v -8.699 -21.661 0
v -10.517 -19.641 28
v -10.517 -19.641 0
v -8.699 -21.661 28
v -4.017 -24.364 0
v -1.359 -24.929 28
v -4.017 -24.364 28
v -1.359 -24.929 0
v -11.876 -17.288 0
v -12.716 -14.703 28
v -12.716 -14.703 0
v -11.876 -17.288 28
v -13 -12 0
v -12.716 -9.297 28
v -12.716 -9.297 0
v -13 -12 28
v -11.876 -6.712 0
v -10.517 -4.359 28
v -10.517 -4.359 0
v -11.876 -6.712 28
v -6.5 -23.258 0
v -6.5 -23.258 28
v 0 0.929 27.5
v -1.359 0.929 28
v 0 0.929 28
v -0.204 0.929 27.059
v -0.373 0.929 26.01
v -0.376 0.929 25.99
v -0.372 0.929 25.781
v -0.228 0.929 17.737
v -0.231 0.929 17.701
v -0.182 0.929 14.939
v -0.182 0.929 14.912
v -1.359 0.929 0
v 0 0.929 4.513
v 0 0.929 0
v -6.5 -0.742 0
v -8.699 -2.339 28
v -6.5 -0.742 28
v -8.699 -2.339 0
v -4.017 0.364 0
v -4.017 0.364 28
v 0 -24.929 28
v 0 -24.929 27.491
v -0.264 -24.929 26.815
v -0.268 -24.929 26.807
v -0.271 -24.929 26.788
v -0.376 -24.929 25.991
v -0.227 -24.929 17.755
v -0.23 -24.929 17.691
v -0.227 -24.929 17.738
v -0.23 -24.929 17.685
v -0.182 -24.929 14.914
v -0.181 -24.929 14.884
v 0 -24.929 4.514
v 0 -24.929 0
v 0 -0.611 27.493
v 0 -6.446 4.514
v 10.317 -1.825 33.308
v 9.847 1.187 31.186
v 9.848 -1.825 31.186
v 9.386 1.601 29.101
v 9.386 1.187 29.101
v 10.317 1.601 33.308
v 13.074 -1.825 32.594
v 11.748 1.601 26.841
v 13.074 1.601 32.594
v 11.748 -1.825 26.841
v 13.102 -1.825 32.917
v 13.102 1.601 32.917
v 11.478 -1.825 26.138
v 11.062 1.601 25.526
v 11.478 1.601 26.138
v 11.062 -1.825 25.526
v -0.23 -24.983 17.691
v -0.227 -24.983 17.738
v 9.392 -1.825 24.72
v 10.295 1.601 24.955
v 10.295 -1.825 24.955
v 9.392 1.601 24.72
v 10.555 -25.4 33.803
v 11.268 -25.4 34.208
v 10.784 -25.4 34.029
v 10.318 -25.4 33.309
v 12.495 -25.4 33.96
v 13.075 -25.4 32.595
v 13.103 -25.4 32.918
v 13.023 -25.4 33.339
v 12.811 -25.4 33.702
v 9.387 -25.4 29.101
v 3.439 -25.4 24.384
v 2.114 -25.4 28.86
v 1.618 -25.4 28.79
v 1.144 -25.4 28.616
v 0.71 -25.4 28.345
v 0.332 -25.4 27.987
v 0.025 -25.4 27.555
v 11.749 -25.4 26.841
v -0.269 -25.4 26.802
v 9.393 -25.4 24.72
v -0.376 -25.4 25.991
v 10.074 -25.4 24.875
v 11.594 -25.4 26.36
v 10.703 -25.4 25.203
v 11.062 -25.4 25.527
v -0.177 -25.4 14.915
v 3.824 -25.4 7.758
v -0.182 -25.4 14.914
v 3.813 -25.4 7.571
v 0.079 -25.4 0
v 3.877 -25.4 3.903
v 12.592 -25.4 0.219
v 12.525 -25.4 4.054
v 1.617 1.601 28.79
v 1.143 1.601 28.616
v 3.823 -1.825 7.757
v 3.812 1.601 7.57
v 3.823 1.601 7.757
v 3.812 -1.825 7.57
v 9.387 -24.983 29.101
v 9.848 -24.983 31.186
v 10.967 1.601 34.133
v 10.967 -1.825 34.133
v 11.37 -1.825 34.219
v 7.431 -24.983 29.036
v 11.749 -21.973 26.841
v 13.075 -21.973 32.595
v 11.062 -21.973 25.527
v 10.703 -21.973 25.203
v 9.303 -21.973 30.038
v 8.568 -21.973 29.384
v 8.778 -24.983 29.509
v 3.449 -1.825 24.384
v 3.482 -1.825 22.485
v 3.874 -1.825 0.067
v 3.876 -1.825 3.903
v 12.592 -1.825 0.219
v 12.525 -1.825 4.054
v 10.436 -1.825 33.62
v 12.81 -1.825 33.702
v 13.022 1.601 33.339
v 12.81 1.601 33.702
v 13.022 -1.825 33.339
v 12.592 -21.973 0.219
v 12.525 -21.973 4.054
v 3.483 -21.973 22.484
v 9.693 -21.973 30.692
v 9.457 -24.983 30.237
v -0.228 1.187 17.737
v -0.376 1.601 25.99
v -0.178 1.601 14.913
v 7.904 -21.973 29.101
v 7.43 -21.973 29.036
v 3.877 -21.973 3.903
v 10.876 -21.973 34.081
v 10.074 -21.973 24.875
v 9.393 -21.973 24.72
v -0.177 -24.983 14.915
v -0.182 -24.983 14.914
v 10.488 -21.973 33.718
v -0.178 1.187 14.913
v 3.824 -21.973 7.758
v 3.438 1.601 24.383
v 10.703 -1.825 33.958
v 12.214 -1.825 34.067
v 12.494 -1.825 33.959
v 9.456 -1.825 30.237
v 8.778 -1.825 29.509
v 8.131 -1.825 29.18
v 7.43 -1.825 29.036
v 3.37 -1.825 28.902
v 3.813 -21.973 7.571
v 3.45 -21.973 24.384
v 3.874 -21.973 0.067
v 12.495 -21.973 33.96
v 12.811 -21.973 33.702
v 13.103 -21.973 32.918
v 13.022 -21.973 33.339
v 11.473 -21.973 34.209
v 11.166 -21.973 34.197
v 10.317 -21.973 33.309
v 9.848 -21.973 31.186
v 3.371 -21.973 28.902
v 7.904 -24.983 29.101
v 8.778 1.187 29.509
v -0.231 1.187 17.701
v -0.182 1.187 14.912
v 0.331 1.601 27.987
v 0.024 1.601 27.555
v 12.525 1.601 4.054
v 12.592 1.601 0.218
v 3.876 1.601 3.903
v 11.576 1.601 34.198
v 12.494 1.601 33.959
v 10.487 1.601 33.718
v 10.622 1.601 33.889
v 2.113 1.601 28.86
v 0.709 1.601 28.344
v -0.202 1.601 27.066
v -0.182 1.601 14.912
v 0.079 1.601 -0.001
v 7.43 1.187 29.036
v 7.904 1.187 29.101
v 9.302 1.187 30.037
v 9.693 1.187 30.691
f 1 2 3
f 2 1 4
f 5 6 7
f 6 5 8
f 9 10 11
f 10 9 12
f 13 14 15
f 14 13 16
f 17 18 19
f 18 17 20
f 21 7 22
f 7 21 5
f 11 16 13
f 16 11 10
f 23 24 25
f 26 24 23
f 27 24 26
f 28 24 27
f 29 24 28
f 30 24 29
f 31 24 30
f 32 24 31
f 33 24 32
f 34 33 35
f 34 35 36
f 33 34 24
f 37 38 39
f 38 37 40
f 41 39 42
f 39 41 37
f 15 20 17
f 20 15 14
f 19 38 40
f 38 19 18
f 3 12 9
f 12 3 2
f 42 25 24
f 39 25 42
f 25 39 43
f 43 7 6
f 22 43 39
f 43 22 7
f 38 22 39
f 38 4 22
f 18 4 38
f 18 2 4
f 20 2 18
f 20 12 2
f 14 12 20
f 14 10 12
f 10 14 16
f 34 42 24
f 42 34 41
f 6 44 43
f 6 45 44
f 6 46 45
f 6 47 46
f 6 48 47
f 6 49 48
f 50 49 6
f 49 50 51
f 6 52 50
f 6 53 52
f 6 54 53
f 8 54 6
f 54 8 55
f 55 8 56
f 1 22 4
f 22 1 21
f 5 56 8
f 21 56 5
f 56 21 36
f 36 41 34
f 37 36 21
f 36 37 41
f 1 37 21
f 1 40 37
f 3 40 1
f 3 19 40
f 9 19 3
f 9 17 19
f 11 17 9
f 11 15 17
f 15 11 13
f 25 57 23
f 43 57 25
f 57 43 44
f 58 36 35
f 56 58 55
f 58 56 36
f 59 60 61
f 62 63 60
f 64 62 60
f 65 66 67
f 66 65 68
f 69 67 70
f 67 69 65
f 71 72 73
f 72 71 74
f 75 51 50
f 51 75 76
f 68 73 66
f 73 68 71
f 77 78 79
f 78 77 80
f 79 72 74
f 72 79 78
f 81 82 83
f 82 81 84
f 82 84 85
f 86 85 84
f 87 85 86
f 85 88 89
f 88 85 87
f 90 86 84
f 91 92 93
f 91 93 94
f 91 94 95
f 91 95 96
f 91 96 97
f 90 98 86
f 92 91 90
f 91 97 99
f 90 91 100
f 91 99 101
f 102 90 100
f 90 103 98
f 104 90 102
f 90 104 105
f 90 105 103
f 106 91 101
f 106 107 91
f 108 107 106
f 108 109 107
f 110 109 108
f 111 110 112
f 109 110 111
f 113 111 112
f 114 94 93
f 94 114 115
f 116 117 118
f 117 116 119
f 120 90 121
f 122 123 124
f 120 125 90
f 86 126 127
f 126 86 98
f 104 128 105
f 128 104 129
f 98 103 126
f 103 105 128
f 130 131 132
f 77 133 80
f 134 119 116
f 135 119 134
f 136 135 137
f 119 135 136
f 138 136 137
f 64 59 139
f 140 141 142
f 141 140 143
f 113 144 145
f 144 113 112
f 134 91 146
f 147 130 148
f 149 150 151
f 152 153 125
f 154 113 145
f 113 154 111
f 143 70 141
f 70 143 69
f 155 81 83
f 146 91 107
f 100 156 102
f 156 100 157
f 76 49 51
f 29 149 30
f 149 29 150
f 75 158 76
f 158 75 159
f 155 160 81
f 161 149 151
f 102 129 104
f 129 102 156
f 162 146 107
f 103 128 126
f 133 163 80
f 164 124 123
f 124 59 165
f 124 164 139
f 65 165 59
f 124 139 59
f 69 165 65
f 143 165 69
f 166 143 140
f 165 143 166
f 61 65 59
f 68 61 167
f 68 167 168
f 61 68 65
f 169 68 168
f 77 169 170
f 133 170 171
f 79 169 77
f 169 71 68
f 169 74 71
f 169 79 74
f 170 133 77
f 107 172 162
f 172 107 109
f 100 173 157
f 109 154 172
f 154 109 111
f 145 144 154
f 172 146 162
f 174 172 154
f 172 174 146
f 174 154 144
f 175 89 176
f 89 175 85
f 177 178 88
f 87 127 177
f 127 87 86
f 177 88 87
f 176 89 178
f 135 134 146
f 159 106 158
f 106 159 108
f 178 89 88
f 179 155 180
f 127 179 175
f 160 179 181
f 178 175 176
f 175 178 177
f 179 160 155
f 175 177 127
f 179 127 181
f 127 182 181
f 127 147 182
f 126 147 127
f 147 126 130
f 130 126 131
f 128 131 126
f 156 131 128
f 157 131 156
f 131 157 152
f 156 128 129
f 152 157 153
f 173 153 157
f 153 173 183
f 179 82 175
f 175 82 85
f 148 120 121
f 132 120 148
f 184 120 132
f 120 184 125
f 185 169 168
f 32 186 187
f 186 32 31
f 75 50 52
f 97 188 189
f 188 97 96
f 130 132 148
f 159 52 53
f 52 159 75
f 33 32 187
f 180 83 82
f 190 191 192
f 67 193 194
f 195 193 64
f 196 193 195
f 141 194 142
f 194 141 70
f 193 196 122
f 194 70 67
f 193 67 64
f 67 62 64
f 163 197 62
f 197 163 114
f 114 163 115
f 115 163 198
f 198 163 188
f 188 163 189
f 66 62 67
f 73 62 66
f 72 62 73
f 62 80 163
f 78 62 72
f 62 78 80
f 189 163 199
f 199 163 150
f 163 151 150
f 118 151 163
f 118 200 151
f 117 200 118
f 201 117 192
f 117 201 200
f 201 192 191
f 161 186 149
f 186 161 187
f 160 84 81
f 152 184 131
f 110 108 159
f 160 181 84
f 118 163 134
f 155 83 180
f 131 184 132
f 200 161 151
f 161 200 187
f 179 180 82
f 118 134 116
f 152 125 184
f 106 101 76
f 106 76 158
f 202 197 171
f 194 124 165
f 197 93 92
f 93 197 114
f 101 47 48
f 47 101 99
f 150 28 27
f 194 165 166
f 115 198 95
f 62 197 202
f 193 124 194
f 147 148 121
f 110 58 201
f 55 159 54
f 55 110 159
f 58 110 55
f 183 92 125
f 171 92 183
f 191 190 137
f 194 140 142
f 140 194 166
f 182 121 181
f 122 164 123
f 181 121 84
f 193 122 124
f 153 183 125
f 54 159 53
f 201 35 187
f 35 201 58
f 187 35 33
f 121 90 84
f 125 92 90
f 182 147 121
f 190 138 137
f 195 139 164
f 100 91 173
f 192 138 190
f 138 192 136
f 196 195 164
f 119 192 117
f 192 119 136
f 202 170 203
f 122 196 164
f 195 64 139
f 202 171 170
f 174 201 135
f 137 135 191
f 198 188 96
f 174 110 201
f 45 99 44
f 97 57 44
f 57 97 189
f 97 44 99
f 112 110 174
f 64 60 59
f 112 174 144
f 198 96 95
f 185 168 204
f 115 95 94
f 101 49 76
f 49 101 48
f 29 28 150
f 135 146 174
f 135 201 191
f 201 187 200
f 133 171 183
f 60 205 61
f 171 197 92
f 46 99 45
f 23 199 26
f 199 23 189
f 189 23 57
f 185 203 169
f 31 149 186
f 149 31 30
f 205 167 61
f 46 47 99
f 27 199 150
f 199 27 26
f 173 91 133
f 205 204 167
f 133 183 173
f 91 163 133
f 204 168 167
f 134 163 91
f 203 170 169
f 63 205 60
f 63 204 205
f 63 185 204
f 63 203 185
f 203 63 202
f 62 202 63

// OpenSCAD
// file: ../pegboard-accessories.scad
use <../../external-resources/mounting-hardware/peg-board/blank-panel-mount/pegboard_2_position_blank.scad>

module pegboardAccessories()
{
    union()
    {
        pegboardAccessories_blank();

        pegboardAccessories_cordedToolHolder();
    }
}

module pegboardAccessories_blank()
{
    color("green")
    translate([15.5, 0, 0])
    pegboardBlankPanel();
}

module pegboardAccessories_cordedToolHolder()
{
    yTranslate = -12;
    height = 28;
    radius = 13;

    difference()
    {
        translate([0, yTranslate, 0])
        cylinder(r = radius, h = height);

        translate([0, yTranslate*2-5, -0.01])
        cube([radius+0.01, radius*2+10, height+0.02]);
    }
}
// main file
use <../pegboard-accessories.scad>

pegboardAccessories();
